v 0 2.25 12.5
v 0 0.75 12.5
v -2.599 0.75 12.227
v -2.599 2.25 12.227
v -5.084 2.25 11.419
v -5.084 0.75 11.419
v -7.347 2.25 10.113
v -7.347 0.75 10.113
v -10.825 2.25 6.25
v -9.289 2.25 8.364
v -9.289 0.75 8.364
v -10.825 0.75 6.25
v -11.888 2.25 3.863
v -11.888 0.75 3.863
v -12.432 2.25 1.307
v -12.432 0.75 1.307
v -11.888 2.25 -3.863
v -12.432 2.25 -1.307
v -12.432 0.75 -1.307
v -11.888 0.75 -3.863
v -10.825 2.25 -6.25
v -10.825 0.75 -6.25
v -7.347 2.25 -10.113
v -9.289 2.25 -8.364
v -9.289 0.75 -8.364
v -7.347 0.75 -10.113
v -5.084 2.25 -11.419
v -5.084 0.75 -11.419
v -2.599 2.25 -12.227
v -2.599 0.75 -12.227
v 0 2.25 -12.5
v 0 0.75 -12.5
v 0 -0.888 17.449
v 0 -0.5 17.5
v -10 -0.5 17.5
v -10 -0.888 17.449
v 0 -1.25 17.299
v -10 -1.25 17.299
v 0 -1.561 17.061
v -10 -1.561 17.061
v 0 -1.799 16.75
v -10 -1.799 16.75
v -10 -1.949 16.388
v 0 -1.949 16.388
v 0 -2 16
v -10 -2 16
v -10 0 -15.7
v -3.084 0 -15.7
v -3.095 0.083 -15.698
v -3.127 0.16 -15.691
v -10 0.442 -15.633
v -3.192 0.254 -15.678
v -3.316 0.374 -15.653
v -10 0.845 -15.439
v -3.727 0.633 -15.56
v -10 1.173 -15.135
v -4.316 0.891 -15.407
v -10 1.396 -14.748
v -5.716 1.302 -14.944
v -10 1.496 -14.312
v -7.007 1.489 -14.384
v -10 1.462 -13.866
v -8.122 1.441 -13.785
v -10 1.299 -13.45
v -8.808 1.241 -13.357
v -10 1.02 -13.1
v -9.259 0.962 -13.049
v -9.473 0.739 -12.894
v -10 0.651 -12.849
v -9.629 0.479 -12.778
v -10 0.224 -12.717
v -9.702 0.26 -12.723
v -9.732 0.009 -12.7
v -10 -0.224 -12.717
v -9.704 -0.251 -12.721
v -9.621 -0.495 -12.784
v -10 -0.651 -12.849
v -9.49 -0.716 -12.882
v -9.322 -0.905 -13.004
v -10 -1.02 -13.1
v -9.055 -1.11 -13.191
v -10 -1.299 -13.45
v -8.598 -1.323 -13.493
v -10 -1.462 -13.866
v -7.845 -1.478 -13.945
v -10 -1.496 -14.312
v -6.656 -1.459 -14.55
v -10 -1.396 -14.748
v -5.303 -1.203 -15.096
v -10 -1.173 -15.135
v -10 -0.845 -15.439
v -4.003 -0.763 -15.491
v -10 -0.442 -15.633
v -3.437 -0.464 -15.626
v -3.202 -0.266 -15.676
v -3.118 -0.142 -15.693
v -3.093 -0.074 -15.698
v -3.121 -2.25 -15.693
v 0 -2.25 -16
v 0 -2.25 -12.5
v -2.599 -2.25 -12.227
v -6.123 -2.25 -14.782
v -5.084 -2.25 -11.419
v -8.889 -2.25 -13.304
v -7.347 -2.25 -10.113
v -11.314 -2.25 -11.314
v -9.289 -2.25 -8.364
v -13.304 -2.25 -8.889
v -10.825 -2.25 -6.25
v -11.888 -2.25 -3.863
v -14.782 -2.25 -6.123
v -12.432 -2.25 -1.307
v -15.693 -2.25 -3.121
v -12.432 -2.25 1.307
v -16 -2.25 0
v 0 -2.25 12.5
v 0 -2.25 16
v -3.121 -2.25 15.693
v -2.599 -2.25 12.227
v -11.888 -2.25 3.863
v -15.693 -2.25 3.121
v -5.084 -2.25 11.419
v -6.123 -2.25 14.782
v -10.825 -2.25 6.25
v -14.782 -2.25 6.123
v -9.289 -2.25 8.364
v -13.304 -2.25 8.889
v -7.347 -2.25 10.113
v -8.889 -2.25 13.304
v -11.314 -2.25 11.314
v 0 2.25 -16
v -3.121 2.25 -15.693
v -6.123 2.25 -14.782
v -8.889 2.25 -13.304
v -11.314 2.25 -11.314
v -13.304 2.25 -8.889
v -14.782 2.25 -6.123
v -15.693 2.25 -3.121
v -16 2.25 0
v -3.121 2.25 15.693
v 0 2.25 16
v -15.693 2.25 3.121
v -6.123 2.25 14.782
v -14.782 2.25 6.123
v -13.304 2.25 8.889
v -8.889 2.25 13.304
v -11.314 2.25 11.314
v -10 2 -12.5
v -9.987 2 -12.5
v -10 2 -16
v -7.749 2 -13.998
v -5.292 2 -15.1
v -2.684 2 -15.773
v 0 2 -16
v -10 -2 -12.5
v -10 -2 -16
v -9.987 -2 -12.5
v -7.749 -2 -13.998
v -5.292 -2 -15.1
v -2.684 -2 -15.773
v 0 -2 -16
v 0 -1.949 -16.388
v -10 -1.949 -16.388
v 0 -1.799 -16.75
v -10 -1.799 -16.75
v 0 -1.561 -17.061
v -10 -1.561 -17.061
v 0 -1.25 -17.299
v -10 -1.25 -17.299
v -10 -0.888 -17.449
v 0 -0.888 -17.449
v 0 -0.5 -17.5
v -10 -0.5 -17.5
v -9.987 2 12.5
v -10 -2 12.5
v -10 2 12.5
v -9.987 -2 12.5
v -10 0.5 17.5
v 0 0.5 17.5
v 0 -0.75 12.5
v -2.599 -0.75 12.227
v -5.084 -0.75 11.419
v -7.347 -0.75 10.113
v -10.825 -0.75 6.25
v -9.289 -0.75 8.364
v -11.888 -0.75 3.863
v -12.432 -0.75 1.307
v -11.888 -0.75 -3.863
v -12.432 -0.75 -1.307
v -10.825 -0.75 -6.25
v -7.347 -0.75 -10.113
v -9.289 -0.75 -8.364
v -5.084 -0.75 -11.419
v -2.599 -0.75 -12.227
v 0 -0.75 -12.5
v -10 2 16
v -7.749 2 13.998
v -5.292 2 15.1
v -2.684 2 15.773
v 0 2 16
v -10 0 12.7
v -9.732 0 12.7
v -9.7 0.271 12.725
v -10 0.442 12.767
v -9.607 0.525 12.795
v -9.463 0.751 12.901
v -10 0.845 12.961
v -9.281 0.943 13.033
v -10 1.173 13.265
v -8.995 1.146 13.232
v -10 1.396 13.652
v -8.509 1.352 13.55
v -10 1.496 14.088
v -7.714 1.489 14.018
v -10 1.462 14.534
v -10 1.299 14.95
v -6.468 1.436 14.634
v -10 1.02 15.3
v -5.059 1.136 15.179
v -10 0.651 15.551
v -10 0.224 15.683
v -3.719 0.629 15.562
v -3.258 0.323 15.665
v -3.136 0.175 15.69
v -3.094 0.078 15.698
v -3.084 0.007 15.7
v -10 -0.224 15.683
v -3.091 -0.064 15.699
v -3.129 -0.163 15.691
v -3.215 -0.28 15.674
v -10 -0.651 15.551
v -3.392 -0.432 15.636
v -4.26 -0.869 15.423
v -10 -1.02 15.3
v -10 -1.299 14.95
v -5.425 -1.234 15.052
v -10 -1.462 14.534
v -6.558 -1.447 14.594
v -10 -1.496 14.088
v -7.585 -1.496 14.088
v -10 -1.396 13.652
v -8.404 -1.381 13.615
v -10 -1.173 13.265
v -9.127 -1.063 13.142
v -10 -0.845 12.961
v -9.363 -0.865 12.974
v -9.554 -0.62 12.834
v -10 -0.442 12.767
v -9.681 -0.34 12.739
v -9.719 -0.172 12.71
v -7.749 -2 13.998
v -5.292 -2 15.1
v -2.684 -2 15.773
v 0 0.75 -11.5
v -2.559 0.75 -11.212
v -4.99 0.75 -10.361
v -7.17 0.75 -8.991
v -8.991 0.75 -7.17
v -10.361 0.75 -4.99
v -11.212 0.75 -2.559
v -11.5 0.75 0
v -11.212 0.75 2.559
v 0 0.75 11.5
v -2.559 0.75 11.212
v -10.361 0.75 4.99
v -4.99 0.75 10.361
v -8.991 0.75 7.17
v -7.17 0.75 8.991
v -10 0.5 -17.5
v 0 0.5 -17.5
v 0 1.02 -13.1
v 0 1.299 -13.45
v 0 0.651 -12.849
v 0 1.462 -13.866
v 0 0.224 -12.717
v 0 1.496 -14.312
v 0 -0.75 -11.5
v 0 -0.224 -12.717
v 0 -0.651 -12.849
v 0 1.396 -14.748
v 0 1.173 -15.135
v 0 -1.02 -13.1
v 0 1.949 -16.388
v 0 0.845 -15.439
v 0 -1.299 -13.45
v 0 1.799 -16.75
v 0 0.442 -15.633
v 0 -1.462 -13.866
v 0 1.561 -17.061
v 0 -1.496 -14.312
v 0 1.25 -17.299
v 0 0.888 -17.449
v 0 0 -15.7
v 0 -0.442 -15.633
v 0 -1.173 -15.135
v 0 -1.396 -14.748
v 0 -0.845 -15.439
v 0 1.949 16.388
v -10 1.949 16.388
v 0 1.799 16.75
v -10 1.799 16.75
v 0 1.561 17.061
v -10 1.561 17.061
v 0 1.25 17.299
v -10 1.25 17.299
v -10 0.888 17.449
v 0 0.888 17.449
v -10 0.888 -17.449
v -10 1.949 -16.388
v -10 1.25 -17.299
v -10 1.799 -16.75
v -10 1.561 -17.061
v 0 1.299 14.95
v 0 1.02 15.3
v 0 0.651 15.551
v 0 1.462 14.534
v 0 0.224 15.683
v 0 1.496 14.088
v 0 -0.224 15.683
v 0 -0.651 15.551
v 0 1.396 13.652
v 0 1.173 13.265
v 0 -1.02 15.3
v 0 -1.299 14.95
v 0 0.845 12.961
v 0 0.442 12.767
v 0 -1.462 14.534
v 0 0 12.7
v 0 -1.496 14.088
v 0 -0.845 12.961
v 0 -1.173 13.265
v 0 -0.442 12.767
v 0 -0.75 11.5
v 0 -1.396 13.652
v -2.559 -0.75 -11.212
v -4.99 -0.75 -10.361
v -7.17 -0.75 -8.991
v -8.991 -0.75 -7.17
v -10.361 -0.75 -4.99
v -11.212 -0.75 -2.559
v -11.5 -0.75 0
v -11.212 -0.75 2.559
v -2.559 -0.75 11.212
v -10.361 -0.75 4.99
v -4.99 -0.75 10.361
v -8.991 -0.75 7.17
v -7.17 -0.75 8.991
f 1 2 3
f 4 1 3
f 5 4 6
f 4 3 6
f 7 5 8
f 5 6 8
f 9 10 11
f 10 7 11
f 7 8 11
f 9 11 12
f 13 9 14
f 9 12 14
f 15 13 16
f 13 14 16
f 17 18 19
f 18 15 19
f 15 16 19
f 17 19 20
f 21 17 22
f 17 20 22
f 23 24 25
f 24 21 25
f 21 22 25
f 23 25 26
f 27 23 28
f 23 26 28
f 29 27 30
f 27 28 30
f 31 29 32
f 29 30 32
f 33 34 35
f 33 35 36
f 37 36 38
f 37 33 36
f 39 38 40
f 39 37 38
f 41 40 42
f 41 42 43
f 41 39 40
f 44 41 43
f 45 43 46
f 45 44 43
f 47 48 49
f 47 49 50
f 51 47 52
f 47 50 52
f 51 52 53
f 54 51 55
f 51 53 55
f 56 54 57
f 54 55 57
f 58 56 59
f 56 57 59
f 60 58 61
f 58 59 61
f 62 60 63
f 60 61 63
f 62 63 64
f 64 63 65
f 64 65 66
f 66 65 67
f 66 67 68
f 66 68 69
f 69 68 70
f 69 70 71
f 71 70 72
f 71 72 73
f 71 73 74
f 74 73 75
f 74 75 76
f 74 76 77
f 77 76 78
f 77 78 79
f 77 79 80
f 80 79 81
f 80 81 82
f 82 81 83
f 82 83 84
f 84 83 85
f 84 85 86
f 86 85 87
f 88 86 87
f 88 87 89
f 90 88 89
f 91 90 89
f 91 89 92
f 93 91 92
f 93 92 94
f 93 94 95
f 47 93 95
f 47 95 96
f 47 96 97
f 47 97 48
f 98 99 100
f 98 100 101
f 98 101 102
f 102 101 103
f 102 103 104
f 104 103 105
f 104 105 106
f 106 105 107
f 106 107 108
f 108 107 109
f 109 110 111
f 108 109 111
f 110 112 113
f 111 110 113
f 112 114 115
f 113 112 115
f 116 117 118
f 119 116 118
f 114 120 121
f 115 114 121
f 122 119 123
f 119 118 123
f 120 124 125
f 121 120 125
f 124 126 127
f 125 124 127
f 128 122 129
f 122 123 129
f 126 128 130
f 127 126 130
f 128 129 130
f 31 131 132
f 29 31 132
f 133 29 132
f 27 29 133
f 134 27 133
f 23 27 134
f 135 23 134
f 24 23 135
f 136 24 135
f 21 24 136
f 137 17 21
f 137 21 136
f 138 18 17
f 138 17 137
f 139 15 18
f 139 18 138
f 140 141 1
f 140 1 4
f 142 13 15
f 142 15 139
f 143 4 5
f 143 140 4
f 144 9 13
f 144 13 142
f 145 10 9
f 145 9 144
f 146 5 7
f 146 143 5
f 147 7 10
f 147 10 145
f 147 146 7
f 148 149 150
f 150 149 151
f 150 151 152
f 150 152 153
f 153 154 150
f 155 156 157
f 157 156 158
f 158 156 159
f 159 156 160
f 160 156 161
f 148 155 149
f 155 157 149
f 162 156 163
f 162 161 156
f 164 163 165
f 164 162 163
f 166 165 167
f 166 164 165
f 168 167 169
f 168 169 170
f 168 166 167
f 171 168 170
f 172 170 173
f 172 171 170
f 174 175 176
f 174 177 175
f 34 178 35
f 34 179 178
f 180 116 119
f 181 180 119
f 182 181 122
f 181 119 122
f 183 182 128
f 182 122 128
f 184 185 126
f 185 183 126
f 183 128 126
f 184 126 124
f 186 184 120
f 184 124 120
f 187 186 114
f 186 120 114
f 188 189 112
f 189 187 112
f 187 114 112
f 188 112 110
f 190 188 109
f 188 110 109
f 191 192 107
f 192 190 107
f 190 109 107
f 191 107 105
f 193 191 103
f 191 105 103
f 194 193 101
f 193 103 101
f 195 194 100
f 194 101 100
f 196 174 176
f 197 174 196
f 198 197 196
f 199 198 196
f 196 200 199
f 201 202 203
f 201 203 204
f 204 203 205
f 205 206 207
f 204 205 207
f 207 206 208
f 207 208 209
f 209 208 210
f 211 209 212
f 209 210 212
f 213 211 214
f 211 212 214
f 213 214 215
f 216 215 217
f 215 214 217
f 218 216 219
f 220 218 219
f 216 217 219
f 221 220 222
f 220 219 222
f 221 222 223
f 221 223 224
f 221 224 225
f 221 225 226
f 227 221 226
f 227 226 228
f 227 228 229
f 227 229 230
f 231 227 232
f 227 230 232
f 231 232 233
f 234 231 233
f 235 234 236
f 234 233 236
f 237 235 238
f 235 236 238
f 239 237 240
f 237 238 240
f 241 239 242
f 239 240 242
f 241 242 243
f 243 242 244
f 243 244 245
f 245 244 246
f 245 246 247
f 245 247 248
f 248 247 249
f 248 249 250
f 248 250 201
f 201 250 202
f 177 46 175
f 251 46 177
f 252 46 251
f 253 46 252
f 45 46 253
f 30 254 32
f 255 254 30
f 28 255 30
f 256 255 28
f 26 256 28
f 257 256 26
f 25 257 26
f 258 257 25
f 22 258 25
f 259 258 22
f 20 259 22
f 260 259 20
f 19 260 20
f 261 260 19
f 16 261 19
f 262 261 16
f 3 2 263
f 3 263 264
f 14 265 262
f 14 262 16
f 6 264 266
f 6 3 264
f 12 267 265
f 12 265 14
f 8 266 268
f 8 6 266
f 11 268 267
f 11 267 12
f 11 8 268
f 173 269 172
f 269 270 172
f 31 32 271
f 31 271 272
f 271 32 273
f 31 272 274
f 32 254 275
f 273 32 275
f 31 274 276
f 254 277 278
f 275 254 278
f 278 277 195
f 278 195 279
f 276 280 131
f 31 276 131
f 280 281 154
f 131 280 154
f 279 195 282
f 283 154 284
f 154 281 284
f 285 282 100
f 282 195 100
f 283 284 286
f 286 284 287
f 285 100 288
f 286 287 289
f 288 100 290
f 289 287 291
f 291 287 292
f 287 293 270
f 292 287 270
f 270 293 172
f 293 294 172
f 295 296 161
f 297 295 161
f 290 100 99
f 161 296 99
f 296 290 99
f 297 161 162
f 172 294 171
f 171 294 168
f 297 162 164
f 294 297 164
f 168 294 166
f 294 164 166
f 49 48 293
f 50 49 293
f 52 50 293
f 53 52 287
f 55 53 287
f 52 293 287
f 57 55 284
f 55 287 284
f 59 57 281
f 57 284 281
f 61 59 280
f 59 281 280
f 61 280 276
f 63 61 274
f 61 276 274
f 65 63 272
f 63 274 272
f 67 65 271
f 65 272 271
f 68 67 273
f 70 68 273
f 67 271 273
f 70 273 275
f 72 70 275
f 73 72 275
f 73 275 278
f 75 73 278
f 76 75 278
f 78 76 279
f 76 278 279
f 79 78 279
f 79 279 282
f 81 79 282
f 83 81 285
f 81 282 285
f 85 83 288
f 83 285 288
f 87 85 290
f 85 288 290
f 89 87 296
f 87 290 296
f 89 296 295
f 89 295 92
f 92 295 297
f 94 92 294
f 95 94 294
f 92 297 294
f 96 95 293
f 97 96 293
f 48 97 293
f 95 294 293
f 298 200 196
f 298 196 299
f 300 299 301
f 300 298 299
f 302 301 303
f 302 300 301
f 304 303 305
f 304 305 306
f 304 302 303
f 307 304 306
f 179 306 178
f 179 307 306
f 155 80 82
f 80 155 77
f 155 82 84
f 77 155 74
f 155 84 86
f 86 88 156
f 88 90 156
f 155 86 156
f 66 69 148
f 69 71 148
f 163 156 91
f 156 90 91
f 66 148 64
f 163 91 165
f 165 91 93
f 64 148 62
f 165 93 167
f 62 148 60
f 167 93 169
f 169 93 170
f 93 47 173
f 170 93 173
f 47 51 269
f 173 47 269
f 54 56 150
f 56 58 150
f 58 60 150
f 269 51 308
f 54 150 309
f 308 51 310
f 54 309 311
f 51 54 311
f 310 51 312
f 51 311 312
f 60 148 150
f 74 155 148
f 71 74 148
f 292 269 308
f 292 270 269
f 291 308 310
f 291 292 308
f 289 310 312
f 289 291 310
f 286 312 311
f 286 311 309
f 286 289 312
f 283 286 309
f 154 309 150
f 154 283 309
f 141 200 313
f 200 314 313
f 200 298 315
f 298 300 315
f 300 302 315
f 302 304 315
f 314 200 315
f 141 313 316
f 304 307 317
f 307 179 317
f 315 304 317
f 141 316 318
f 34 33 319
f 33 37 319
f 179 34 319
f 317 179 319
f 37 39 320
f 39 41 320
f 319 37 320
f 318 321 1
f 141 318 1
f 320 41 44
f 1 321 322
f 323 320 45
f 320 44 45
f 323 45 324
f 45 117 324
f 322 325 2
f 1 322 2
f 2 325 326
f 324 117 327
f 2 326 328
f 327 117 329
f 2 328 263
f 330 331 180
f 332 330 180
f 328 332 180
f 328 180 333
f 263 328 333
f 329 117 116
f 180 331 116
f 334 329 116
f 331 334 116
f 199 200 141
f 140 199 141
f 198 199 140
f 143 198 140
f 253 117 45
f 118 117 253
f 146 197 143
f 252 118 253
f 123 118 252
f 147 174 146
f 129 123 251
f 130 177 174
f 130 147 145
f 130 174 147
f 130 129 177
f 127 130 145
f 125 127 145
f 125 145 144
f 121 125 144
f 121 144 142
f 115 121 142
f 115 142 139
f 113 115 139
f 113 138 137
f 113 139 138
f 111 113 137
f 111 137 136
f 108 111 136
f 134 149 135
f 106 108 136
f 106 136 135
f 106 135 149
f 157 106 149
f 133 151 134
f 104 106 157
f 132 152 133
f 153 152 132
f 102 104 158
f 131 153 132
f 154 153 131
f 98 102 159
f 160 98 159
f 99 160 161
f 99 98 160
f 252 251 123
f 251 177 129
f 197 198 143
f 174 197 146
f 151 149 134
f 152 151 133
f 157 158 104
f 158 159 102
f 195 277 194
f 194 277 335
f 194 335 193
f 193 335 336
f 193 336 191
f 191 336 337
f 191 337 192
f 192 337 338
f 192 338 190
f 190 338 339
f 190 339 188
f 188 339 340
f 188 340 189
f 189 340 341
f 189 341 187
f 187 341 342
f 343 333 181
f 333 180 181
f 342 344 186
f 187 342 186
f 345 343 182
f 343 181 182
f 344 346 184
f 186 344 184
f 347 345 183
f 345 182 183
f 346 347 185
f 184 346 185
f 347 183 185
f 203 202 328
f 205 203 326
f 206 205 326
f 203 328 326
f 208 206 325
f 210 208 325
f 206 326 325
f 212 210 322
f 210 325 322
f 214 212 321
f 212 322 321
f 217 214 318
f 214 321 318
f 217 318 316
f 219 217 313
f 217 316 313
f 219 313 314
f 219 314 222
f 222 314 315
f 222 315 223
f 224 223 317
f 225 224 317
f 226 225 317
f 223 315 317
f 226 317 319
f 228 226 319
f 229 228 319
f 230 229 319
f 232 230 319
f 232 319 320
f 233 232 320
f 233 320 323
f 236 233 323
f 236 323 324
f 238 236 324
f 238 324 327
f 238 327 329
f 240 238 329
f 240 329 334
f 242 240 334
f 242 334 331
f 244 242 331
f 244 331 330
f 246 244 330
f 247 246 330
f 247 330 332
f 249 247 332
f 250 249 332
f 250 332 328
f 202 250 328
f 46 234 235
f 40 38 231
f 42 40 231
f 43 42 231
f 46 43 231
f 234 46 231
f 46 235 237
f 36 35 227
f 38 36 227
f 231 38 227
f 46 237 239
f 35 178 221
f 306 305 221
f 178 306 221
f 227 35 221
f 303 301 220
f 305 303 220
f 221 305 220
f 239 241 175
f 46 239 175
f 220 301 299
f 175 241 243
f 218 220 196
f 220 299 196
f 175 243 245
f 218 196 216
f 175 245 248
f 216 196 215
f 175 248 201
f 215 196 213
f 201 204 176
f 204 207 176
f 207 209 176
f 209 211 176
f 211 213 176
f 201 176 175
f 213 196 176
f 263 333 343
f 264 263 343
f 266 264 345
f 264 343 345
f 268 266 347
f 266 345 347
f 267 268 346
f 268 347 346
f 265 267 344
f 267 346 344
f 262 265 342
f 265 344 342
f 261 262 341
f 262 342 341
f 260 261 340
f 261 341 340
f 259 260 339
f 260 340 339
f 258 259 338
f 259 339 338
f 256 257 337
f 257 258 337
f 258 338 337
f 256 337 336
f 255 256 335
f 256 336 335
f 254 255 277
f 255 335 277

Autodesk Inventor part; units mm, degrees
ref_plane "YZ Plane" through (0, 0, 0) normal (1, 0, 0) x (0, 1, 0)
ref_plane "XZ Plane" through (0, 0, 0) normal (0, 1, 0) x (-1, 0, 0)
ref_plane "XY Plane" through (0, 0, 0) normal (0, 0, 1) x (1, 0, 0)
sketch "Sketch1" plane through (0, 0, 0) normal (0, 1, 0) x (-1, 0, 0)
  arc A0 (0, -16) -> (0, 16) centre (0, 0) ccw
  arc A1 (0, -11.5) -> (0, 11.5) centre (0, 0) ccw
  line L0 (0, 16) -> (0, 11.5)
  line L1 (0, -11.5) -> (0, -16)
  arc A2 (0, -12.5) -> (0, 12.5) centre (0, 0) ccw
  dimension "d0" = 32
  dimension "d1" = 23
  dimension "d2" = 0
  dimension "d3" = 0
  dimension "d4" = 25
  dimension "d5" = 0
  dimension "d6" = 16
  dimension "d7" = 0
  dimension "d8" = 16
extrude "Extrusion1" add sketch "Sketch1" along normal mid plane 4.5 contours L1 A2 L0 A0
extrude "Extrusion2" add sketch "Sketch1" along normal mid plane 1.5 contours L1 A1 L0 A2
sketch "Sketch3" plane through (0, -2.25, -16) normal (1, 0, 0) x (0, 0, -1)
  line L0 (-32, 4.5) -> (-28.5, 4.5)
  line L1 (-30.25, 4.5) -> (-30.25, 4.25)
  line L2 (-28.5, 0) -> (-32, 0)
  line L3 (-30.25, 0) -> (-30.25, 0.25)
  line L4 (-28.5, 3) -> (-28.5, 4.5)
  line L5 (-28.5, 4.25) -> (-32, 4.25)
  line L6 (-33.5, 2.75) -> (-33.5, 1.75)
  line L7 (-32, 0.25) -> (-28.5, 0.25)
  line L8 (-28.5, 0.25) -> (-28.5, 4.25)
  arc A0 (-32, 4.25) -> (-33.5, 2.75) centre (-32, 2.75) ccw
  arc A1 (-33.5, 1.75) -> (-32, 0.25) centre (-32, 1.75) ccw
  circle A2 centre (-30.2, 2.25) radius 1.5
  line L9 (-32, 4.5) -> (-32, 0)
  line L10 (-3.5, 1.5) -> (-28.5, 1.5)
  line L11 (-3.5, 4.25) -> (0, 4.25)
  circle A3 centre (-1.8, 2.25) radius 1.5
  arc A4 (1.5, 2.75) -> (0, 4.25) centre (0, 2.75) ccw
  arc A5 (0, 0.25) -> (1.5, 1.75) centre (0, 1.75) ccw
  line L12 (1.5, 2.75) -> (1.5, 1.75)
  line L13 (-3.5, 3) -> (-3.5, 4.25)
  line L14 (0, 0.25) -> (-3.5, 0.25)
  line L15 (-3.5, 0.25) -> (-3.5, 4.25)
  line L16 (-4.5, 3) -> (-4.5, 1.5)
  line L17 (-27.5, 3) -> (-4.5, 3)
  line L18 (-27.5, 1.5) -> (-27.5, 3)
  line L19 (-4.5, 1.5) -> (-27.5, 1.5)
  point P0 (-16, 2.25)
  dimension "d13" = 3
  dimension "d14" = 5
  dimension "d15" = 2.7
  dimension "d16" = 2.7
  dimension "d17" = 90
  dimension "d18" = 90
  dimension "d19" = 90
  dimension "d20" = 6
  dimension "d21" = 2.75
  dimension "d22" = 1.25
  dimension "d23" = 1
  dimension "d24" = 0
  dimension "d25" = 24
  dimension "d26" = 27.5
  dimension "d27" = 29
  dimension "d28" = 1.5
  dimension "d29" = 3
  dimension "d30" = 25.75
  dimension "d31" = 0.75
  dimension "d32" = 1.5
  dimension "d33" = 1.5
  dimension "d34" = 24
  dimension "d35" = 0.75
  dimension "d36" = 2.75
  dimension "d37" = 1.25
extrude "Extrusion3" add sketch "Sketch3" against normal blind 10 contours L15 L13 L11 A4 L12 A5 L14 | L9 A1 L6 A0 | L5 L4 L8 L7 L9
extrude "Extrusion4" cut sketch "Sketch3" against normal blind 10 contours A2 | A3
properties part number "reverse gear lower trap"
